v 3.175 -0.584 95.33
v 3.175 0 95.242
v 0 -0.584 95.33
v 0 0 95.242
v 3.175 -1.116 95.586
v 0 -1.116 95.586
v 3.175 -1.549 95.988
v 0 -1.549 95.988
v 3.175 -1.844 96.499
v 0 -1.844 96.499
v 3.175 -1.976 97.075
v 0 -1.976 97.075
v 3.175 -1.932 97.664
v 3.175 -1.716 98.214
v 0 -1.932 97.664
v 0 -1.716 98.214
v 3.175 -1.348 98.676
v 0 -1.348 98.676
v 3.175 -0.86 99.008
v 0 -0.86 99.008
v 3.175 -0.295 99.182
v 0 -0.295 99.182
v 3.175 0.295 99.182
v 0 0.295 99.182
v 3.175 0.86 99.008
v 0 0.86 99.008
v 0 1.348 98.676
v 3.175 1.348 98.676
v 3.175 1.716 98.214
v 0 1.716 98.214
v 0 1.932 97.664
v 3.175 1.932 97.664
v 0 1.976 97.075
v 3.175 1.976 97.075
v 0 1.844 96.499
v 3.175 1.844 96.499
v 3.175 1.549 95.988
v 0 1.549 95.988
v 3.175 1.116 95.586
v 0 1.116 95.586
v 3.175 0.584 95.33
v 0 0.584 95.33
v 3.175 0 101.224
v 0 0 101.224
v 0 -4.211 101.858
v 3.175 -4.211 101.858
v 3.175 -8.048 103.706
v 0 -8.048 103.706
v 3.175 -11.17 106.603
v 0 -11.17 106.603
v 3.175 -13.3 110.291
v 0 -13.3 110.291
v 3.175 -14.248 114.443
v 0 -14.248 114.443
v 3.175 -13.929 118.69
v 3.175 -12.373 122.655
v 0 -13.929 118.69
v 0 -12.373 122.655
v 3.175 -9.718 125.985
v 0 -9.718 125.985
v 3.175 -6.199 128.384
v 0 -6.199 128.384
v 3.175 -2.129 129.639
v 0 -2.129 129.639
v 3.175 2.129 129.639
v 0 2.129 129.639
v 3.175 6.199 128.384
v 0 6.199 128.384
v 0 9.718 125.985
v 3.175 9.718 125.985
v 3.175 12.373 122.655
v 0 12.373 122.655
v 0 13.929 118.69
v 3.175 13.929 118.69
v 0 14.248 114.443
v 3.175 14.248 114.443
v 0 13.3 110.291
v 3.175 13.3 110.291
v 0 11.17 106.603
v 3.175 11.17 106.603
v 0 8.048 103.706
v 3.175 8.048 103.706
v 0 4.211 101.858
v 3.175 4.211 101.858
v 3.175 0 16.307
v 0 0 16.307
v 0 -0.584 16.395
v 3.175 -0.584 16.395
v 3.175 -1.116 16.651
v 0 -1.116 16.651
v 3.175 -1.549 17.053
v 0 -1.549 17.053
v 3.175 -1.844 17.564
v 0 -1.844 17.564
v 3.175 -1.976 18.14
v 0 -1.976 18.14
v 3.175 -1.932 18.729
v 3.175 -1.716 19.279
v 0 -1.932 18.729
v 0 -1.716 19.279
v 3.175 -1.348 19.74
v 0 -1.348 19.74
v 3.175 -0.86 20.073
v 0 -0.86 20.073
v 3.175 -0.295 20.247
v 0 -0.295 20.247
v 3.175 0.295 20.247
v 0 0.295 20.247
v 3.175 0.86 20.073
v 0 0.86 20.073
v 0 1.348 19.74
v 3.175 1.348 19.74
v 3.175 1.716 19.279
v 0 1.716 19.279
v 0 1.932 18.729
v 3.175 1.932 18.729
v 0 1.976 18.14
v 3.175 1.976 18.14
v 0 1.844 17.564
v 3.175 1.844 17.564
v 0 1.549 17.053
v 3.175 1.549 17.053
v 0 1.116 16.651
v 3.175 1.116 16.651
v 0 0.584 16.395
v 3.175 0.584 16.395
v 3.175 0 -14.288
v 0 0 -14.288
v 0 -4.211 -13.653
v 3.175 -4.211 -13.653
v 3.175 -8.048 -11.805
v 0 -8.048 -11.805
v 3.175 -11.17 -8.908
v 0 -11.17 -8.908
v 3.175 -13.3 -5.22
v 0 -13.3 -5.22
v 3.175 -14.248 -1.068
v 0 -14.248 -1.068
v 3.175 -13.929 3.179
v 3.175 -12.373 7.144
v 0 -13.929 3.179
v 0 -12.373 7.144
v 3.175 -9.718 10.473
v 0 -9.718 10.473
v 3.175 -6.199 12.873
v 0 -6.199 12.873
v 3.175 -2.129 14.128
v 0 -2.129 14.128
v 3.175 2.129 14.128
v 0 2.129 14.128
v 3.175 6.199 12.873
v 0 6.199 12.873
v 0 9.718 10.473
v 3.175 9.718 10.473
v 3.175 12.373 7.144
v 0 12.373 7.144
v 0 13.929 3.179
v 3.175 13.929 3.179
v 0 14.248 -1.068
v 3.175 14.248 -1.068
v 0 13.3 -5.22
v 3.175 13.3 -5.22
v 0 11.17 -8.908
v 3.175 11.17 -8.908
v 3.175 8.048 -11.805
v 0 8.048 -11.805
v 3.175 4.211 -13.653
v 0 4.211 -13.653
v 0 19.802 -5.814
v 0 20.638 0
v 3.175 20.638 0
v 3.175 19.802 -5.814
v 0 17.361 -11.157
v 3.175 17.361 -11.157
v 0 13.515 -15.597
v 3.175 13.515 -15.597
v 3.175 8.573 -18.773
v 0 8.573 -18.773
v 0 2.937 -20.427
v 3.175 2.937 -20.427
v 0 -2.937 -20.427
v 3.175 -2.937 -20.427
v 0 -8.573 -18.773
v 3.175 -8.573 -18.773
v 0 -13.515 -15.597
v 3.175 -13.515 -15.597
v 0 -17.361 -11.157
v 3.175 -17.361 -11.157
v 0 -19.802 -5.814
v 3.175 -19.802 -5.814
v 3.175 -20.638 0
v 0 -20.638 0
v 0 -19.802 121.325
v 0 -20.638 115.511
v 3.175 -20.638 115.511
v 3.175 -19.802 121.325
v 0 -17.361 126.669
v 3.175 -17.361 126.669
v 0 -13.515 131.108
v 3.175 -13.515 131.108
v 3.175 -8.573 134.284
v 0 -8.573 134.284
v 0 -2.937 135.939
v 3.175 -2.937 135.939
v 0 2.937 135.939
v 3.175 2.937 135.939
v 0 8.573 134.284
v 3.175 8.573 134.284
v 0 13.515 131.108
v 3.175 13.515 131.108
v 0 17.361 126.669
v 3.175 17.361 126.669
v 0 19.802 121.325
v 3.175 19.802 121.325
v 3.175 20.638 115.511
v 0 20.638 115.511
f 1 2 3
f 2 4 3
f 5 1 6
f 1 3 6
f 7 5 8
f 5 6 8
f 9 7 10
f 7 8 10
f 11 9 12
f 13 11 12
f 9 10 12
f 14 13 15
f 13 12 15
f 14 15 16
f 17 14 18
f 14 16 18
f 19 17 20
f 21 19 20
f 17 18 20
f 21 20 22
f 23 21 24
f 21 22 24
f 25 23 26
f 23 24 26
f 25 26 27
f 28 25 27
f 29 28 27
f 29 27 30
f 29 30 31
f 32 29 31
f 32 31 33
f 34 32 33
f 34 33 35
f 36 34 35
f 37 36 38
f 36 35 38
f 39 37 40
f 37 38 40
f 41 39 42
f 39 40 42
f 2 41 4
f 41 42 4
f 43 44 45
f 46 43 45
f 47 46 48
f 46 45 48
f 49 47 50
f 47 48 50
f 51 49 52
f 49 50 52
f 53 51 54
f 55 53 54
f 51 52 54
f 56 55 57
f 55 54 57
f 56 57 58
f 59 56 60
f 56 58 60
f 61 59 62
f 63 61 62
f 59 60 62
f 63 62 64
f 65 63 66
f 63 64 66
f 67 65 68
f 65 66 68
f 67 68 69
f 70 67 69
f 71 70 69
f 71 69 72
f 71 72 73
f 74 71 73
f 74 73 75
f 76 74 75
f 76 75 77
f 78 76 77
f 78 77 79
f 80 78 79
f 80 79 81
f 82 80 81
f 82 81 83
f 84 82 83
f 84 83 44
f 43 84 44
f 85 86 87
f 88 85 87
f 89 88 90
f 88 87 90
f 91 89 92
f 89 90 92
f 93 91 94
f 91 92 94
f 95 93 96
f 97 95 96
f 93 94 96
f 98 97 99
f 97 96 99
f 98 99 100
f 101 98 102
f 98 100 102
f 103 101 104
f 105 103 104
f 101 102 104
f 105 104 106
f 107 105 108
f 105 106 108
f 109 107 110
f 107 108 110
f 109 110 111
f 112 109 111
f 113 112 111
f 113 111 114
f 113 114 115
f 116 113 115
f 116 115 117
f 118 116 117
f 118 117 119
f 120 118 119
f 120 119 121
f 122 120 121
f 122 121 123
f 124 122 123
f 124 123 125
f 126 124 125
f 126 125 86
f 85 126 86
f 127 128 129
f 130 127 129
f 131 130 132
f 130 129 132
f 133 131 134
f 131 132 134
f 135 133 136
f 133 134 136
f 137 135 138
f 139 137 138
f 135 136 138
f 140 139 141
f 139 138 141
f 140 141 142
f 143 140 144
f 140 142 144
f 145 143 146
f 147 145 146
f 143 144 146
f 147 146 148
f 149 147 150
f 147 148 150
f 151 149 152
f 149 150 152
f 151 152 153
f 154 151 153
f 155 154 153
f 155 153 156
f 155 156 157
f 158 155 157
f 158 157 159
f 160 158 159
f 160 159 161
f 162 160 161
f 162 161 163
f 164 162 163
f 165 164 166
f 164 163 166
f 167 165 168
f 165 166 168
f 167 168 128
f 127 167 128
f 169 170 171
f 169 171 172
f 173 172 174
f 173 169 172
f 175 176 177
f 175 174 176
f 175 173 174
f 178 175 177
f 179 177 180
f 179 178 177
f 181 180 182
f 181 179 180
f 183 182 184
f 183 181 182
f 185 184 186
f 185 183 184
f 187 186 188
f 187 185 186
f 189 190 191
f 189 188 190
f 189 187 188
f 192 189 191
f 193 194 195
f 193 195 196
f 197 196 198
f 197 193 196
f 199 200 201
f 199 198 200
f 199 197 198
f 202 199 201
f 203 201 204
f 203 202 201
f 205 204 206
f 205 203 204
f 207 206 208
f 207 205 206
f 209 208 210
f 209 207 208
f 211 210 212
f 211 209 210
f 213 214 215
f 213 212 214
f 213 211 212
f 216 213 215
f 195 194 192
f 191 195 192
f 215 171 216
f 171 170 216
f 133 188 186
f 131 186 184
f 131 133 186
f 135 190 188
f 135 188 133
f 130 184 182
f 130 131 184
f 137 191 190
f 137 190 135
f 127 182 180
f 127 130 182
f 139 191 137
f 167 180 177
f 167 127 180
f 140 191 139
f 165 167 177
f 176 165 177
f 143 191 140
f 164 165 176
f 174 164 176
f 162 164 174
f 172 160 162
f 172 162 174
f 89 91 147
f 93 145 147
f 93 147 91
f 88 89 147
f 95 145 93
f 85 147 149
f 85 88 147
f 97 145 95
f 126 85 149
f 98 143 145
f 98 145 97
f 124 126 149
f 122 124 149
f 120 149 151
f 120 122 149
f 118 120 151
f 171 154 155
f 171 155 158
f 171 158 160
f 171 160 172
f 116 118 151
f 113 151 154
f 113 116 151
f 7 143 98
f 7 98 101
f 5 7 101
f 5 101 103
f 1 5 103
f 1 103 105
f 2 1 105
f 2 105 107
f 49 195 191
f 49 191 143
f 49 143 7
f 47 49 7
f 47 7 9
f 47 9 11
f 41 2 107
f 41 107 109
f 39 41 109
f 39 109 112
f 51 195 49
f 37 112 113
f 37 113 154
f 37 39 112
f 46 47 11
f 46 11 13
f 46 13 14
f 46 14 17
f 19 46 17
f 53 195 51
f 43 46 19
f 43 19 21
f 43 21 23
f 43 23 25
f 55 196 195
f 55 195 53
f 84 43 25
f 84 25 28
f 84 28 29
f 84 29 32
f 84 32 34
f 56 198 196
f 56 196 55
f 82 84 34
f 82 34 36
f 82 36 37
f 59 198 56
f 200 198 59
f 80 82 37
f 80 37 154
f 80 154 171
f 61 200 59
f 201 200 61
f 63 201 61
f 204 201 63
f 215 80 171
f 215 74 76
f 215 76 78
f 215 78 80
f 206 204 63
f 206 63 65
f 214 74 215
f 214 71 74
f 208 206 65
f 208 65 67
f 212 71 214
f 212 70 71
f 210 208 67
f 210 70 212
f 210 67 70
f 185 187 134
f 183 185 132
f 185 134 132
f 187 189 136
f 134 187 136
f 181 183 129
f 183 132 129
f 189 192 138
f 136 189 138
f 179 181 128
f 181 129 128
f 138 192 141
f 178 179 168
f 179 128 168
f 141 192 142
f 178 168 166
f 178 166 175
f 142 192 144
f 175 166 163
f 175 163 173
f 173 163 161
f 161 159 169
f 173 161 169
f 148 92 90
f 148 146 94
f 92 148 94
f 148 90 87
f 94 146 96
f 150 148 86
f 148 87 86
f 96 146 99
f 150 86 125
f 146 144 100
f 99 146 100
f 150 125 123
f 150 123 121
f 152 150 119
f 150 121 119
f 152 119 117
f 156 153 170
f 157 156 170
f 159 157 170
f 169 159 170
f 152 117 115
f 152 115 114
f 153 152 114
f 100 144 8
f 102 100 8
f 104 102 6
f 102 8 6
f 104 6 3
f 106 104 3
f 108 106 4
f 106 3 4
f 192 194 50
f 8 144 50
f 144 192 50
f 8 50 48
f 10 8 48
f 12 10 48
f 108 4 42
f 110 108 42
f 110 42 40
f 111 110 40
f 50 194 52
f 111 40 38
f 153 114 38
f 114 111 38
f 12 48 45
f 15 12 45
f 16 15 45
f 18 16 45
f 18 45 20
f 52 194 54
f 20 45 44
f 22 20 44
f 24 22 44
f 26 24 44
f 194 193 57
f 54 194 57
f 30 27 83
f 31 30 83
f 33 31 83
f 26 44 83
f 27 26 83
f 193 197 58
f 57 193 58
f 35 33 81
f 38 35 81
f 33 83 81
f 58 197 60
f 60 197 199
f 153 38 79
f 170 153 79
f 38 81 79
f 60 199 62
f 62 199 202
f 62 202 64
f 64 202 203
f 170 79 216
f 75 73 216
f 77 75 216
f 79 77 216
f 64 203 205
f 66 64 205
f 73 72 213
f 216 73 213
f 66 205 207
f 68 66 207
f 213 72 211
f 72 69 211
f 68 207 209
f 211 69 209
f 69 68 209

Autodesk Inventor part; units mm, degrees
ref_plane "YZ Plane" through (0, 0, 0) normal (1, 0, 0) x (0, 1, 0)
ref_plane "XZ Plane" through (0, 0, 0) normal (0, 1, 0) x (-1, 0, 0)
ref_plane "XY Plane" through (0, 0, 0) normal (0, 0, 1) x (1, 0, 0)
sketch "Sketch1" plane through (0, 0, 0) normal (1, 0, 0) x (0, 1, 0)
  arc A0 (-20.6375, 0) -> (20.6375, 0) centre (0, 0) ccw
  arc A1 (20.6375, 115.5112) -> (-20.6375, 115.5112) centre (0, 115.5112) ccw
  line L0 (-20.6375, 115.5112) -> (-20.6375, 0)
  line L1 (20.6375, 0) -> (20.6375, 115.5112)
  dimension "d0" = 115.5112
  dimension "d1" = 41.275
extrude "Plate1" add sketch "Sketch1" along normal blind 3.175
sketch "Sketch2" plane through (3.175, 0, 0) normal (1, 0, 0) x (0, 0, -1)
  point P0 (0, 0)
  point P1 (0, 0)
  point P2 (0, 0)
  point P3 (-115.5112, 0)
  dimension "d21" = 115.5112
hole "Hole1" at (3.175, 0, 0) at (3.175, 0, 115.5112) direction (-1, 0, 0) diameter 28.575 depth 3.175 tip angle 118
sketch "Sketch3" plane through (3.175, 0, 0) normal (1, 0, 0) x (0, 0, -1)
  circle A0 centre (0, 0) radius 15.5575 construction
  point P0 (-18.288, 0)
  point P1 (-115.5112, 0)
  point P2 (-97.2232, 0)
  dimension "d10" = 31.115
  dimension "d13" = 18.288
  dimension "d22" = 115.5112
  dimension "d23" = 18.288
hole "Hole2" at (3.175, 0, 18.288) at (3.175, 0, 97.2232) direction (-1, 0, 0) diameter 3.9624 depth 13.6144 tip angle 118 thread size "10-32 UNF" class "2B" standard "ANSI Unified Screw Threads"
equation "\"d21\" = d0"
equation "\"d8\" = Thickness"
equation "\"d2\" = Thickness"
equation "\"d22\" = d0"
equation "\"d23\" = d13"
equation "\"BendRadius\" = Thickness"
equation "\"BendReliefWidth\" = Thickness"
equation "\"BendReliefDepth\" = 0.5 * Thickness"
equation "\"CornerReliefSize\" = 4 * Thickness"
equation "\"MinimumRemnant\" = 2 * Thickness"
equation "\"TransitionRadius\" = BendRadius"
equation "\"JacobiRadiusSize\" = BendRadius"
equation "\"GapSize\" = Thickness"
equation "\"Thickness\" = 3.175"
properties part number "PLATE,KICKER,MOTOR,SUPPORT" material "Polycarbonate, Clear"
